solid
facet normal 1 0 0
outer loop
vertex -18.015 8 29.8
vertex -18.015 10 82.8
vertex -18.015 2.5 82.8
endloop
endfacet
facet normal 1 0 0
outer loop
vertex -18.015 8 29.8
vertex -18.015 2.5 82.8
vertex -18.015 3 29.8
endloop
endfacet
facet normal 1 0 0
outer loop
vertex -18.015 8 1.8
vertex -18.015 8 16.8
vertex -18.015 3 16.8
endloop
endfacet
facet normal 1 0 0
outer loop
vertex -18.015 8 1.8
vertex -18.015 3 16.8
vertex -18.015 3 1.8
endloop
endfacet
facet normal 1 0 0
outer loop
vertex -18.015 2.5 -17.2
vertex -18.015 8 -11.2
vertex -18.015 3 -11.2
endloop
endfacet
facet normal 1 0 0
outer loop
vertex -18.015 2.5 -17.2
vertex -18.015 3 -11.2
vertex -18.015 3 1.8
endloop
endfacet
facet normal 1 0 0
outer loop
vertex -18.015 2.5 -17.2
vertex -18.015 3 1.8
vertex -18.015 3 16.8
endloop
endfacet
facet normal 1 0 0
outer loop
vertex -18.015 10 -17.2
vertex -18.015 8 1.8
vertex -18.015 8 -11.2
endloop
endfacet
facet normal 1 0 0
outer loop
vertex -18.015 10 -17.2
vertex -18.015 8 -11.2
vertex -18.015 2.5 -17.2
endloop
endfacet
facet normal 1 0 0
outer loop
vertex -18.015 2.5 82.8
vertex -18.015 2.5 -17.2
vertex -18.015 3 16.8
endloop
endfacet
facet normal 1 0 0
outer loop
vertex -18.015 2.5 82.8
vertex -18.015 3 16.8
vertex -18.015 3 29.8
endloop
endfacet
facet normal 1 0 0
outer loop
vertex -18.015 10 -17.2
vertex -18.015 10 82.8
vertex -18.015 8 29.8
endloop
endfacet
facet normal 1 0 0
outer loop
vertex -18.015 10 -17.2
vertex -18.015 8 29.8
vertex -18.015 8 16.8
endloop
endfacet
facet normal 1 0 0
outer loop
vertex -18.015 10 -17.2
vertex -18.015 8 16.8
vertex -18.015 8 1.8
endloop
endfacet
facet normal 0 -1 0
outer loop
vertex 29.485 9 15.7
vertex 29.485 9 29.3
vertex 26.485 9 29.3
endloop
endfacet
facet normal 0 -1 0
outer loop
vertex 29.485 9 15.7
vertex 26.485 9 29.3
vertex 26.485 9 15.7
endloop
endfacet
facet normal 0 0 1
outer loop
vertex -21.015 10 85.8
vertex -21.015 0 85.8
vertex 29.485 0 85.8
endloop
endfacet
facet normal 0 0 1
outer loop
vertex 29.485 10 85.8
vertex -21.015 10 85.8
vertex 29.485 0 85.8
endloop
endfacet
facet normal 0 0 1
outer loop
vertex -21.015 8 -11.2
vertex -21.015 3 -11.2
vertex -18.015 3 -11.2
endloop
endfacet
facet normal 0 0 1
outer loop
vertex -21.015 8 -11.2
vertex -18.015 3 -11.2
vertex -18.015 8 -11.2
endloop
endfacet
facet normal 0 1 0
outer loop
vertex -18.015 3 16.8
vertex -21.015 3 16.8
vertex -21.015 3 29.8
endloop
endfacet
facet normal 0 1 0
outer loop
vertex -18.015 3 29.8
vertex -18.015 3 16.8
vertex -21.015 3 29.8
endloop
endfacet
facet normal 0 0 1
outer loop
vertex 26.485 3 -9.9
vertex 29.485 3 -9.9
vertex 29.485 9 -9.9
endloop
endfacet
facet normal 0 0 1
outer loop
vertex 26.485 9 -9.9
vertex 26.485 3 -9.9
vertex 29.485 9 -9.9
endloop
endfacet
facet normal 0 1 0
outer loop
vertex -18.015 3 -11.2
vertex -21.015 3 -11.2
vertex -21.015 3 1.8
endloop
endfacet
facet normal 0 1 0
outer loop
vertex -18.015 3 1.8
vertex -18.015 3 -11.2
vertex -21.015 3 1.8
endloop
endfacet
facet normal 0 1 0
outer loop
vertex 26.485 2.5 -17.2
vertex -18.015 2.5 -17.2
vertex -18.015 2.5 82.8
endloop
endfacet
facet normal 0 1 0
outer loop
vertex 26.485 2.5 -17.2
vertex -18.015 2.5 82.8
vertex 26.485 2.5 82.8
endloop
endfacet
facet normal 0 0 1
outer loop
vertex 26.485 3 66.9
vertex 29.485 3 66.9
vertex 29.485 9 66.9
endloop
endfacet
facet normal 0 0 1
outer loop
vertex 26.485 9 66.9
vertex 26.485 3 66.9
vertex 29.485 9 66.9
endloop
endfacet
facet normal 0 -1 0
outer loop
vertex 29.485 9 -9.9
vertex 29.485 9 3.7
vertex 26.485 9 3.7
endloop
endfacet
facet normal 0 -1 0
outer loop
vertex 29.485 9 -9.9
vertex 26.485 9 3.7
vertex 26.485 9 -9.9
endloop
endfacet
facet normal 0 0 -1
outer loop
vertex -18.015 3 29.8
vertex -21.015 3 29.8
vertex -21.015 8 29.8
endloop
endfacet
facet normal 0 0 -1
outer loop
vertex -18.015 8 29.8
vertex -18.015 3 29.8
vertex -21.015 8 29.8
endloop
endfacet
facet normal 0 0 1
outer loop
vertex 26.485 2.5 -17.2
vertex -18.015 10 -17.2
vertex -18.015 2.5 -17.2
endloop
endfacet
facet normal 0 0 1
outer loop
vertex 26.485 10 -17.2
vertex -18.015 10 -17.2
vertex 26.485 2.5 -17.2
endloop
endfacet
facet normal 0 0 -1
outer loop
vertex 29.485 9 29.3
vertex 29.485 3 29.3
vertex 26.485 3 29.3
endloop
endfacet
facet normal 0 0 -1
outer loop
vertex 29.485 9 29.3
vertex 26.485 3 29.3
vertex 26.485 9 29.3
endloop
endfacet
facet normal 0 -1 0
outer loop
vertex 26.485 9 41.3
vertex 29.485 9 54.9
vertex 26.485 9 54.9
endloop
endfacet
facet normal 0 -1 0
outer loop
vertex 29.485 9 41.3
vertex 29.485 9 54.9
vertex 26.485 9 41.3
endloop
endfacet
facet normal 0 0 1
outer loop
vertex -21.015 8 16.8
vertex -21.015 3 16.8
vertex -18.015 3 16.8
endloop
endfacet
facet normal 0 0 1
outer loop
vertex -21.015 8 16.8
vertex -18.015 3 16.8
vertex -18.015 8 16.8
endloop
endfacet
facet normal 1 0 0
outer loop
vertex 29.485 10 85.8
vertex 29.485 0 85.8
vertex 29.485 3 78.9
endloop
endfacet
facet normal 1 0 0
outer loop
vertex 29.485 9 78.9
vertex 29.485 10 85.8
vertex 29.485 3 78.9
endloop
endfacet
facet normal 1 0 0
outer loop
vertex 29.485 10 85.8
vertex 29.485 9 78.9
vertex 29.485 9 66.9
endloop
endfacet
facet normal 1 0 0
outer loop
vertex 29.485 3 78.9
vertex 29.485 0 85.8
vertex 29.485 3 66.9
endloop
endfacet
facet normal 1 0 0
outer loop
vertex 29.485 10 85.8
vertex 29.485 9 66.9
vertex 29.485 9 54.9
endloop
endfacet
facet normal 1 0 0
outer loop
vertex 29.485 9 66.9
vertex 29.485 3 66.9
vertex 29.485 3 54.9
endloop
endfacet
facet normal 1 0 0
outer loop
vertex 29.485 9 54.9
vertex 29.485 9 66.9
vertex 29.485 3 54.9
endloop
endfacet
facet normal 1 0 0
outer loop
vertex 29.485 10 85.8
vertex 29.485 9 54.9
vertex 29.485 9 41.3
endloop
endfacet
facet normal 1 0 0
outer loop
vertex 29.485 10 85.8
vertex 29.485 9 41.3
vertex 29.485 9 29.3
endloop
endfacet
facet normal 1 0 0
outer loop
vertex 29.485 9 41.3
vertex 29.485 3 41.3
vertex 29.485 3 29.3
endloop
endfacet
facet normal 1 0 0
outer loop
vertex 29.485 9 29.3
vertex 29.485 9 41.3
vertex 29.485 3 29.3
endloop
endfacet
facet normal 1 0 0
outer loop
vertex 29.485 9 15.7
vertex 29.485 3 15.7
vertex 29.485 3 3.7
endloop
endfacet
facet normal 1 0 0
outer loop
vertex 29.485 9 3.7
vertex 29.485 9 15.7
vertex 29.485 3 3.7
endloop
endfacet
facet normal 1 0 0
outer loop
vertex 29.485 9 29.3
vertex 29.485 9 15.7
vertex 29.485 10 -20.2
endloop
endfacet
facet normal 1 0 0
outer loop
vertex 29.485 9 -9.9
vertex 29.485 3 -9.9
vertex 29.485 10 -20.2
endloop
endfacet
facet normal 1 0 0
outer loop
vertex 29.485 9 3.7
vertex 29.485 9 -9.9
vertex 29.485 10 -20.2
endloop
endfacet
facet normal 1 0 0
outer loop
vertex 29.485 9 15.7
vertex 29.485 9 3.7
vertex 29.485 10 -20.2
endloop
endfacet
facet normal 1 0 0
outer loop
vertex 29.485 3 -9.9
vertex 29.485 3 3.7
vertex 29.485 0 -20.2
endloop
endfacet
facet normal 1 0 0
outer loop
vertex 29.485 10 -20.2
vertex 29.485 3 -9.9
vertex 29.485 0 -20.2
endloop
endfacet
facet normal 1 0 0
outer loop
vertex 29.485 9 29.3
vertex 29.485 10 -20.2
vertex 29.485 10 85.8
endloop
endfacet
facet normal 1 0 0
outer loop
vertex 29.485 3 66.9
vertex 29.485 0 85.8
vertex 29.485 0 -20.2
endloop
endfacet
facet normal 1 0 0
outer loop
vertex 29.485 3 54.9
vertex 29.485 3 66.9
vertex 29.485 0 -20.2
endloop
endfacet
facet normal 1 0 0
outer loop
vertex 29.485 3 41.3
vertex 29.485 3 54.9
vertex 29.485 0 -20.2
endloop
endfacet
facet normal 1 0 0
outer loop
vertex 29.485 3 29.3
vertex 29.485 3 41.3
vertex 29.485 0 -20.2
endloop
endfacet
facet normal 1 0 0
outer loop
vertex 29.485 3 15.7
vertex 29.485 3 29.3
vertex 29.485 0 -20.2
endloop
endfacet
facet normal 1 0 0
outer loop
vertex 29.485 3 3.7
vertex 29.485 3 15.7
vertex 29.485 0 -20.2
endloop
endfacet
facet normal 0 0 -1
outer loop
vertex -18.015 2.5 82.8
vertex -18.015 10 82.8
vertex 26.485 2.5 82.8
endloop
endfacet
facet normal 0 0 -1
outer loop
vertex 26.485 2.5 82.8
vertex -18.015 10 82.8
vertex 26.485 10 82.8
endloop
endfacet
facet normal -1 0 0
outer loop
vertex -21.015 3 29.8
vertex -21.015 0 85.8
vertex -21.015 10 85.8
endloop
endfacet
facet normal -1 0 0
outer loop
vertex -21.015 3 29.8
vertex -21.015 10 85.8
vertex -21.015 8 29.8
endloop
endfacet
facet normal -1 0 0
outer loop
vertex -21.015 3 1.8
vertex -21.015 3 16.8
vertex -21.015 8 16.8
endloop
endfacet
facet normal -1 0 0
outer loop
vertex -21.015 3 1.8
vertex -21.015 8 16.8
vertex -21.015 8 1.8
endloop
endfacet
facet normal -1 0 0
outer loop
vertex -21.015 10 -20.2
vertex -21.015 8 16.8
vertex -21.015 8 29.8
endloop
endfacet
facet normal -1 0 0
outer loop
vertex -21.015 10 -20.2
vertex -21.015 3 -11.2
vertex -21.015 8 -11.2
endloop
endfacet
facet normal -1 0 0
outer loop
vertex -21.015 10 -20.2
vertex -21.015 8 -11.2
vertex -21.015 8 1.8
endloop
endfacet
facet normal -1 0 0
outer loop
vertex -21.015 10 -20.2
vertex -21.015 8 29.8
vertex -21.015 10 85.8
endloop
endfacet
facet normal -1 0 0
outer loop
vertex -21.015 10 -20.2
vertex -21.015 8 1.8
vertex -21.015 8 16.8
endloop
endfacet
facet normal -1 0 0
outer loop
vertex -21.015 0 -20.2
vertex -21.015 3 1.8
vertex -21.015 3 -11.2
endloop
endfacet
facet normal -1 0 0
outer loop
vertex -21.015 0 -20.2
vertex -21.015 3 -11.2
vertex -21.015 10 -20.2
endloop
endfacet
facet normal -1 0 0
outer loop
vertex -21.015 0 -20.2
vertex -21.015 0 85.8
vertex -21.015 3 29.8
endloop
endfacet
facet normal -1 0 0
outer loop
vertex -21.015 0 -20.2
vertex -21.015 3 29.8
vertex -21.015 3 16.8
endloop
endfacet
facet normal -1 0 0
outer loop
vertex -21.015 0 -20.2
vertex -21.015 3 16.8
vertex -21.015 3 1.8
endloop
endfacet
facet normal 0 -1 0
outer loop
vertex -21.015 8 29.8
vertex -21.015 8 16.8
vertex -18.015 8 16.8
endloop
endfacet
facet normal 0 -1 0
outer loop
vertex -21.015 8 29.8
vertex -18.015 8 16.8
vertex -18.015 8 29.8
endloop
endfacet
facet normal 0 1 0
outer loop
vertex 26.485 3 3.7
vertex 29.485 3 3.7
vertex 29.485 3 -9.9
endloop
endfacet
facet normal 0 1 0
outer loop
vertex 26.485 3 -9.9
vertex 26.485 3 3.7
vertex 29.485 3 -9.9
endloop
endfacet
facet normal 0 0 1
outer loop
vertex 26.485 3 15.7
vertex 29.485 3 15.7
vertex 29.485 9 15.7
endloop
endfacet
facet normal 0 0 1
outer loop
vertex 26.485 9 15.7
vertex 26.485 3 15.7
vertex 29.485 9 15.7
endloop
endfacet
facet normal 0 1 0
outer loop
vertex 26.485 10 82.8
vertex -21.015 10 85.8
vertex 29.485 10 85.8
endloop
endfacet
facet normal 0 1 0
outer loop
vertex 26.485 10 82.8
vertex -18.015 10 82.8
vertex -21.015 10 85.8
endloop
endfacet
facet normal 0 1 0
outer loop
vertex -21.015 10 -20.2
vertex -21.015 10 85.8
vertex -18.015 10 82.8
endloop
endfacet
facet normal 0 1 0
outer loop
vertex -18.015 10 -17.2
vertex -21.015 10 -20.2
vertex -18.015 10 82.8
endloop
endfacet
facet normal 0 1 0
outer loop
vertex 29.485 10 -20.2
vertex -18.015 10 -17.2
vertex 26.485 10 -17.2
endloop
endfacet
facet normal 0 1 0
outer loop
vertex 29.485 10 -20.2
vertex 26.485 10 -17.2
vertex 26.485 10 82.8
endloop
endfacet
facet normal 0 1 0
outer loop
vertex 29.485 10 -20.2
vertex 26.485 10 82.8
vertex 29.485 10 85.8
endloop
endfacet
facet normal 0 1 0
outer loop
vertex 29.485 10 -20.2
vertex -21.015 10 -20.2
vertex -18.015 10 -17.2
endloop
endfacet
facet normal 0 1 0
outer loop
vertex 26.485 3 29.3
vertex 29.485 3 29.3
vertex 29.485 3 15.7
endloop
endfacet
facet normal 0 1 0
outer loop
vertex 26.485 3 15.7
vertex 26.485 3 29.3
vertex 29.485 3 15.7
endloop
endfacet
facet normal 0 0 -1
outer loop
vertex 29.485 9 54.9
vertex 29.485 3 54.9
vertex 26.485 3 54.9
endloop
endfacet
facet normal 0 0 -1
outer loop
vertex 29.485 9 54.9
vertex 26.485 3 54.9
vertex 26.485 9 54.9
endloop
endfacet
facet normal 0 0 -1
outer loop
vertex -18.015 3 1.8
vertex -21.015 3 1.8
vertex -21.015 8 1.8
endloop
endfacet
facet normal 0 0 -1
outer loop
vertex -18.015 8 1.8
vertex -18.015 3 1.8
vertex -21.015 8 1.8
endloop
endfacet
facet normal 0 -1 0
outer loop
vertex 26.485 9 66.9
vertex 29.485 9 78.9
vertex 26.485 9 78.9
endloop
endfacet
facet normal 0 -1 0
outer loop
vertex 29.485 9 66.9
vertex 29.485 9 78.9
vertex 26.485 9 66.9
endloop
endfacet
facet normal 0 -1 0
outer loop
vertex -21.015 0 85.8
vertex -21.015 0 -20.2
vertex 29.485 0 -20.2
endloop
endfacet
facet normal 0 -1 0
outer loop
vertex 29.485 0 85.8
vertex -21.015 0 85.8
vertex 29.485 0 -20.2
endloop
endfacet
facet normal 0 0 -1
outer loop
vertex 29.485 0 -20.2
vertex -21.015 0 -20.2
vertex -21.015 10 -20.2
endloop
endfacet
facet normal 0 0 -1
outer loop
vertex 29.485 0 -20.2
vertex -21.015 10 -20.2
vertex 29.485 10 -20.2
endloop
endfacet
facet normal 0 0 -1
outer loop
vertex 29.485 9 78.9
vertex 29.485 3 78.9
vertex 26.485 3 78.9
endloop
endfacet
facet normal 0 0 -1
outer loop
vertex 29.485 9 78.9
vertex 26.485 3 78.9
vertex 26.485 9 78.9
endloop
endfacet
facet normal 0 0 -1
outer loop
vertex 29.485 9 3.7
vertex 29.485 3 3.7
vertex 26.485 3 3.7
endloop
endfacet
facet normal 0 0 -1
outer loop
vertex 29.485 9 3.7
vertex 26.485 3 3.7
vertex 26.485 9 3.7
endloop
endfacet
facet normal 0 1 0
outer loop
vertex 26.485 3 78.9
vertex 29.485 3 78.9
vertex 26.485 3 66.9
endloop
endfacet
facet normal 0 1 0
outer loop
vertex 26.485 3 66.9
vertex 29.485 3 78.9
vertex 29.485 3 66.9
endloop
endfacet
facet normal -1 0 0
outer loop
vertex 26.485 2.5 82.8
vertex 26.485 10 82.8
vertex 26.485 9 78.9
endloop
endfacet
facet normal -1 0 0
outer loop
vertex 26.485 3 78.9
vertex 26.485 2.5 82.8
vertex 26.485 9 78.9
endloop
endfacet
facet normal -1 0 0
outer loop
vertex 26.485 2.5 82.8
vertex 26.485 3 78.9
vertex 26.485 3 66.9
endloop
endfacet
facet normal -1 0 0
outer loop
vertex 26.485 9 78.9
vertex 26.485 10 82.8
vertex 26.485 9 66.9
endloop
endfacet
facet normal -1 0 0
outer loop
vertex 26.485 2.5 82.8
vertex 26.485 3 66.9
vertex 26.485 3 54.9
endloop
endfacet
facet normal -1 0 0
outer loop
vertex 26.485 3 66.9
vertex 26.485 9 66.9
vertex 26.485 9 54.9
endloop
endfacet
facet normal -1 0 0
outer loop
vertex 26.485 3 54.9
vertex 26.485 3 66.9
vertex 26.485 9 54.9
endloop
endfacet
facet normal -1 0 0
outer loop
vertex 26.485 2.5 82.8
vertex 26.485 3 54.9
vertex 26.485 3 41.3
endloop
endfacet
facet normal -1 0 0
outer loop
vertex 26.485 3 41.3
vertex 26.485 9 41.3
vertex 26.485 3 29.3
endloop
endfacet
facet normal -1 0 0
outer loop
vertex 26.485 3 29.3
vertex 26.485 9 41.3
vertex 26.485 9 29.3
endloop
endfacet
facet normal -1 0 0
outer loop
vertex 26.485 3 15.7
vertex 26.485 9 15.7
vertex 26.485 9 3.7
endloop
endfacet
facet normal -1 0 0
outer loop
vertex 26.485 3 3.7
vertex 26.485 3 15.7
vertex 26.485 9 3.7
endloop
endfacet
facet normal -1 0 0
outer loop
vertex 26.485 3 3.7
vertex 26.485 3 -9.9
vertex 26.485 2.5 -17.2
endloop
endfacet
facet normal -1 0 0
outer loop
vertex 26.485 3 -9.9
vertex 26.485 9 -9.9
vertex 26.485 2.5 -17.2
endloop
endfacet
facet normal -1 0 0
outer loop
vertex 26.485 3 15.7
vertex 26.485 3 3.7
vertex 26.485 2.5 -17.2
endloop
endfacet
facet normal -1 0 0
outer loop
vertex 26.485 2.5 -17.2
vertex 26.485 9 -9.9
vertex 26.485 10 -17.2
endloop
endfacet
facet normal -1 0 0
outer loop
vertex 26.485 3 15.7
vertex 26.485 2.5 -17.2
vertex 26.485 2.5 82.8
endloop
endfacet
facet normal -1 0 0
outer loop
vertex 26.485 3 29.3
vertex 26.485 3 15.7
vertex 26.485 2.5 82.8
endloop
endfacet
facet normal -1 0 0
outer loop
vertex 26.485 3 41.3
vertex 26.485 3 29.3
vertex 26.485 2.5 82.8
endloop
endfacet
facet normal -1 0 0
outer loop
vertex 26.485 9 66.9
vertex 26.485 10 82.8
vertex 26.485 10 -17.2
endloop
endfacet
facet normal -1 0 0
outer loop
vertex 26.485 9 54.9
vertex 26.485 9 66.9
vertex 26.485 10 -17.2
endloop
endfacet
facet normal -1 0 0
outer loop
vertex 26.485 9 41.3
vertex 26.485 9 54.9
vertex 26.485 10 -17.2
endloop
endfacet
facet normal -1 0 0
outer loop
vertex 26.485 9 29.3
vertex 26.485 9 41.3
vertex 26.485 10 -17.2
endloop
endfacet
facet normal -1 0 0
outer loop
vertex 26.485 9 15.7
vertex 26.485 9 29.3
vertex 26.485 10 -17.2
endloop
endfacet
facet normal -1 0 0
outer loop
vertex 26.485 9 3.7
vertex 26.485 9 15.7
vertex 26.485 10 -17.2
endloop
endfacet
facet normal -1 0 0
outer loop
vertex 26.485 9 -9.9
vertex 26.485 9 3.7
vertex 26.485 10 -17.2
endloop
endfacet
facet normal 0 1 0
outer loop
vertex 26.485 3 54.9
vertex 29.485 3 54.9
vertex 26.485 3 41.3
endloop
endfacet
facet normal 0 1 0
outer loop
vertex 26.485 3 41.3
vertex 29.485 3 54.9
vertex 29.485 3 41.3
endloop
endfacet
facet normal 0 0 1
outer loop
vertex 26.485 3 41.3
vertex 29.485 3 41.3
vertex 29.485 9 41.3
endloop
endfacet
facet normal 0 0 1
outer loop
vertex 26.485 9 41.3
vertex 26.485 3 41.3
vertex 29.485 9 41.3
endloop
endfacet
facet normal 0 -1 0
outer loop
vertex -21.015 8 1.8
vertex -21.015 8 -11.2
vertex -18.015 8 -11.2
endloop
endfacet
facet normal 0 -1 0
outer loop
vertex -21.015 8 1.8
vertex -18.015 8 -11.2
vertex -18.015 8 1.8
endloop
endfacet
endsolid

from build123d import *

# Parameters (mm, degrees)
SKETCH_1_W          = 50.5
SKETCH_1_H          = 106
EXTRUDE_1_DEPTH     = 10
SKETCH_4_W          = 44.5
SKETCH_4_H          = 100
EXTRUDE_7_DEPTH     = 7
SKETCH_4_4_W        = 44.5
SKETCH_4_4_H        = 100
CUT_EXTRUDE_1_DEPTH = 7.5
SKETCH_6_W          = 13
SKETCH_6_H          = 5
CUT_EXTRUDE_2_DEPTH = 3
SKETCH_7_W          = 13.6
SKETCH_7_H          = 6
SKETCH_7_W_2        = 12
CUT_EXTRUDE_3_DEPTH = 3


with BuildPart() as part:
    # 草图1 → 凸台-拉伸1 (new body)
    with BuildSketch(Plane(origin=(0, 0, 0), x_dir=(1, 0, 0), z_dir=(0, 1, 0))):
        with Locations((4.235483871, -32.8)):
            Rectangle(SKETCH_1_W, SKETCH_1_H)
    extrude(amount=EXTRUDE_1_DEPTH)

    # 草图4 → 凸台-拉伸7 (add)
    with BuildSketch(Plane(origin=(0, 10, 0), x_dir=(1, 0, 0), z_dir=(0, 1, 0))):
        with Locations((4.235483871, -32.8)):
            Rectangle(SKETCH_4_W, SKETCH_4_H)
    extrude(amount=-EXTRUDE_7_DEPTH)

    # 草图4<4> → 切除-拉伸1 (cut)
    with BuildSketch(Plane(origin=(0, 10, 0), x_dir=(1, 0, 0), z_dir=(0, 1, 0))):
        with Locations((4.235483871, -32.8)):
            Rectangle(SKETCH_4_4_W, SKETCH_4_4_H)
    extrude(amount=-CUT_EXTRUDE_1_DEPTH, mode=Mode.SUBTRACT)

    # 草图6 → 切除-拉伸2 (cut)
    with BuildSketch(Plane.ZY.offset(21.014516129)):
        with Locations((-4.7, 5.5)):
            Rectangle(SKETCH_6_W, SKETCH_6_H)
        with Locations((23.3, 5.5)):
            Rectangle(SKETCH_6_W, SKETCH_6_H)
    extrude(amount=-CUT_EXTRUDE_2_DEPTH, mode=Mode.SUBTRACT)

    # 草图7 → 切除-拉伸3 (cut)
    with BuildSketch(Plane(origin=(29.485483871, 0, 0), x_dir=(0, 0, -1), z_dir=(1, 0, 0))):
        with Locations((3.1, 6)):
            Rectangle(SKETCH_7_W, SKETCH_7_H)
        with Locations((-22.5, 6)):
            Rectangle(SKETCH_7_W, SKETCH_7_H)
        with Locations((-48.1, 6)):
            Rectangle(SKETCH_7_W, SKETCH_7_H)
        with Locations((-72.9, 6)):
            Rectangle(SKETCH_7_W_2, SKETCH_7_H)
    extrude(amount=-CUT_EXTRUDE_3_DEPTH, mode=Mode.SUBTRACT)


solid = part.part
